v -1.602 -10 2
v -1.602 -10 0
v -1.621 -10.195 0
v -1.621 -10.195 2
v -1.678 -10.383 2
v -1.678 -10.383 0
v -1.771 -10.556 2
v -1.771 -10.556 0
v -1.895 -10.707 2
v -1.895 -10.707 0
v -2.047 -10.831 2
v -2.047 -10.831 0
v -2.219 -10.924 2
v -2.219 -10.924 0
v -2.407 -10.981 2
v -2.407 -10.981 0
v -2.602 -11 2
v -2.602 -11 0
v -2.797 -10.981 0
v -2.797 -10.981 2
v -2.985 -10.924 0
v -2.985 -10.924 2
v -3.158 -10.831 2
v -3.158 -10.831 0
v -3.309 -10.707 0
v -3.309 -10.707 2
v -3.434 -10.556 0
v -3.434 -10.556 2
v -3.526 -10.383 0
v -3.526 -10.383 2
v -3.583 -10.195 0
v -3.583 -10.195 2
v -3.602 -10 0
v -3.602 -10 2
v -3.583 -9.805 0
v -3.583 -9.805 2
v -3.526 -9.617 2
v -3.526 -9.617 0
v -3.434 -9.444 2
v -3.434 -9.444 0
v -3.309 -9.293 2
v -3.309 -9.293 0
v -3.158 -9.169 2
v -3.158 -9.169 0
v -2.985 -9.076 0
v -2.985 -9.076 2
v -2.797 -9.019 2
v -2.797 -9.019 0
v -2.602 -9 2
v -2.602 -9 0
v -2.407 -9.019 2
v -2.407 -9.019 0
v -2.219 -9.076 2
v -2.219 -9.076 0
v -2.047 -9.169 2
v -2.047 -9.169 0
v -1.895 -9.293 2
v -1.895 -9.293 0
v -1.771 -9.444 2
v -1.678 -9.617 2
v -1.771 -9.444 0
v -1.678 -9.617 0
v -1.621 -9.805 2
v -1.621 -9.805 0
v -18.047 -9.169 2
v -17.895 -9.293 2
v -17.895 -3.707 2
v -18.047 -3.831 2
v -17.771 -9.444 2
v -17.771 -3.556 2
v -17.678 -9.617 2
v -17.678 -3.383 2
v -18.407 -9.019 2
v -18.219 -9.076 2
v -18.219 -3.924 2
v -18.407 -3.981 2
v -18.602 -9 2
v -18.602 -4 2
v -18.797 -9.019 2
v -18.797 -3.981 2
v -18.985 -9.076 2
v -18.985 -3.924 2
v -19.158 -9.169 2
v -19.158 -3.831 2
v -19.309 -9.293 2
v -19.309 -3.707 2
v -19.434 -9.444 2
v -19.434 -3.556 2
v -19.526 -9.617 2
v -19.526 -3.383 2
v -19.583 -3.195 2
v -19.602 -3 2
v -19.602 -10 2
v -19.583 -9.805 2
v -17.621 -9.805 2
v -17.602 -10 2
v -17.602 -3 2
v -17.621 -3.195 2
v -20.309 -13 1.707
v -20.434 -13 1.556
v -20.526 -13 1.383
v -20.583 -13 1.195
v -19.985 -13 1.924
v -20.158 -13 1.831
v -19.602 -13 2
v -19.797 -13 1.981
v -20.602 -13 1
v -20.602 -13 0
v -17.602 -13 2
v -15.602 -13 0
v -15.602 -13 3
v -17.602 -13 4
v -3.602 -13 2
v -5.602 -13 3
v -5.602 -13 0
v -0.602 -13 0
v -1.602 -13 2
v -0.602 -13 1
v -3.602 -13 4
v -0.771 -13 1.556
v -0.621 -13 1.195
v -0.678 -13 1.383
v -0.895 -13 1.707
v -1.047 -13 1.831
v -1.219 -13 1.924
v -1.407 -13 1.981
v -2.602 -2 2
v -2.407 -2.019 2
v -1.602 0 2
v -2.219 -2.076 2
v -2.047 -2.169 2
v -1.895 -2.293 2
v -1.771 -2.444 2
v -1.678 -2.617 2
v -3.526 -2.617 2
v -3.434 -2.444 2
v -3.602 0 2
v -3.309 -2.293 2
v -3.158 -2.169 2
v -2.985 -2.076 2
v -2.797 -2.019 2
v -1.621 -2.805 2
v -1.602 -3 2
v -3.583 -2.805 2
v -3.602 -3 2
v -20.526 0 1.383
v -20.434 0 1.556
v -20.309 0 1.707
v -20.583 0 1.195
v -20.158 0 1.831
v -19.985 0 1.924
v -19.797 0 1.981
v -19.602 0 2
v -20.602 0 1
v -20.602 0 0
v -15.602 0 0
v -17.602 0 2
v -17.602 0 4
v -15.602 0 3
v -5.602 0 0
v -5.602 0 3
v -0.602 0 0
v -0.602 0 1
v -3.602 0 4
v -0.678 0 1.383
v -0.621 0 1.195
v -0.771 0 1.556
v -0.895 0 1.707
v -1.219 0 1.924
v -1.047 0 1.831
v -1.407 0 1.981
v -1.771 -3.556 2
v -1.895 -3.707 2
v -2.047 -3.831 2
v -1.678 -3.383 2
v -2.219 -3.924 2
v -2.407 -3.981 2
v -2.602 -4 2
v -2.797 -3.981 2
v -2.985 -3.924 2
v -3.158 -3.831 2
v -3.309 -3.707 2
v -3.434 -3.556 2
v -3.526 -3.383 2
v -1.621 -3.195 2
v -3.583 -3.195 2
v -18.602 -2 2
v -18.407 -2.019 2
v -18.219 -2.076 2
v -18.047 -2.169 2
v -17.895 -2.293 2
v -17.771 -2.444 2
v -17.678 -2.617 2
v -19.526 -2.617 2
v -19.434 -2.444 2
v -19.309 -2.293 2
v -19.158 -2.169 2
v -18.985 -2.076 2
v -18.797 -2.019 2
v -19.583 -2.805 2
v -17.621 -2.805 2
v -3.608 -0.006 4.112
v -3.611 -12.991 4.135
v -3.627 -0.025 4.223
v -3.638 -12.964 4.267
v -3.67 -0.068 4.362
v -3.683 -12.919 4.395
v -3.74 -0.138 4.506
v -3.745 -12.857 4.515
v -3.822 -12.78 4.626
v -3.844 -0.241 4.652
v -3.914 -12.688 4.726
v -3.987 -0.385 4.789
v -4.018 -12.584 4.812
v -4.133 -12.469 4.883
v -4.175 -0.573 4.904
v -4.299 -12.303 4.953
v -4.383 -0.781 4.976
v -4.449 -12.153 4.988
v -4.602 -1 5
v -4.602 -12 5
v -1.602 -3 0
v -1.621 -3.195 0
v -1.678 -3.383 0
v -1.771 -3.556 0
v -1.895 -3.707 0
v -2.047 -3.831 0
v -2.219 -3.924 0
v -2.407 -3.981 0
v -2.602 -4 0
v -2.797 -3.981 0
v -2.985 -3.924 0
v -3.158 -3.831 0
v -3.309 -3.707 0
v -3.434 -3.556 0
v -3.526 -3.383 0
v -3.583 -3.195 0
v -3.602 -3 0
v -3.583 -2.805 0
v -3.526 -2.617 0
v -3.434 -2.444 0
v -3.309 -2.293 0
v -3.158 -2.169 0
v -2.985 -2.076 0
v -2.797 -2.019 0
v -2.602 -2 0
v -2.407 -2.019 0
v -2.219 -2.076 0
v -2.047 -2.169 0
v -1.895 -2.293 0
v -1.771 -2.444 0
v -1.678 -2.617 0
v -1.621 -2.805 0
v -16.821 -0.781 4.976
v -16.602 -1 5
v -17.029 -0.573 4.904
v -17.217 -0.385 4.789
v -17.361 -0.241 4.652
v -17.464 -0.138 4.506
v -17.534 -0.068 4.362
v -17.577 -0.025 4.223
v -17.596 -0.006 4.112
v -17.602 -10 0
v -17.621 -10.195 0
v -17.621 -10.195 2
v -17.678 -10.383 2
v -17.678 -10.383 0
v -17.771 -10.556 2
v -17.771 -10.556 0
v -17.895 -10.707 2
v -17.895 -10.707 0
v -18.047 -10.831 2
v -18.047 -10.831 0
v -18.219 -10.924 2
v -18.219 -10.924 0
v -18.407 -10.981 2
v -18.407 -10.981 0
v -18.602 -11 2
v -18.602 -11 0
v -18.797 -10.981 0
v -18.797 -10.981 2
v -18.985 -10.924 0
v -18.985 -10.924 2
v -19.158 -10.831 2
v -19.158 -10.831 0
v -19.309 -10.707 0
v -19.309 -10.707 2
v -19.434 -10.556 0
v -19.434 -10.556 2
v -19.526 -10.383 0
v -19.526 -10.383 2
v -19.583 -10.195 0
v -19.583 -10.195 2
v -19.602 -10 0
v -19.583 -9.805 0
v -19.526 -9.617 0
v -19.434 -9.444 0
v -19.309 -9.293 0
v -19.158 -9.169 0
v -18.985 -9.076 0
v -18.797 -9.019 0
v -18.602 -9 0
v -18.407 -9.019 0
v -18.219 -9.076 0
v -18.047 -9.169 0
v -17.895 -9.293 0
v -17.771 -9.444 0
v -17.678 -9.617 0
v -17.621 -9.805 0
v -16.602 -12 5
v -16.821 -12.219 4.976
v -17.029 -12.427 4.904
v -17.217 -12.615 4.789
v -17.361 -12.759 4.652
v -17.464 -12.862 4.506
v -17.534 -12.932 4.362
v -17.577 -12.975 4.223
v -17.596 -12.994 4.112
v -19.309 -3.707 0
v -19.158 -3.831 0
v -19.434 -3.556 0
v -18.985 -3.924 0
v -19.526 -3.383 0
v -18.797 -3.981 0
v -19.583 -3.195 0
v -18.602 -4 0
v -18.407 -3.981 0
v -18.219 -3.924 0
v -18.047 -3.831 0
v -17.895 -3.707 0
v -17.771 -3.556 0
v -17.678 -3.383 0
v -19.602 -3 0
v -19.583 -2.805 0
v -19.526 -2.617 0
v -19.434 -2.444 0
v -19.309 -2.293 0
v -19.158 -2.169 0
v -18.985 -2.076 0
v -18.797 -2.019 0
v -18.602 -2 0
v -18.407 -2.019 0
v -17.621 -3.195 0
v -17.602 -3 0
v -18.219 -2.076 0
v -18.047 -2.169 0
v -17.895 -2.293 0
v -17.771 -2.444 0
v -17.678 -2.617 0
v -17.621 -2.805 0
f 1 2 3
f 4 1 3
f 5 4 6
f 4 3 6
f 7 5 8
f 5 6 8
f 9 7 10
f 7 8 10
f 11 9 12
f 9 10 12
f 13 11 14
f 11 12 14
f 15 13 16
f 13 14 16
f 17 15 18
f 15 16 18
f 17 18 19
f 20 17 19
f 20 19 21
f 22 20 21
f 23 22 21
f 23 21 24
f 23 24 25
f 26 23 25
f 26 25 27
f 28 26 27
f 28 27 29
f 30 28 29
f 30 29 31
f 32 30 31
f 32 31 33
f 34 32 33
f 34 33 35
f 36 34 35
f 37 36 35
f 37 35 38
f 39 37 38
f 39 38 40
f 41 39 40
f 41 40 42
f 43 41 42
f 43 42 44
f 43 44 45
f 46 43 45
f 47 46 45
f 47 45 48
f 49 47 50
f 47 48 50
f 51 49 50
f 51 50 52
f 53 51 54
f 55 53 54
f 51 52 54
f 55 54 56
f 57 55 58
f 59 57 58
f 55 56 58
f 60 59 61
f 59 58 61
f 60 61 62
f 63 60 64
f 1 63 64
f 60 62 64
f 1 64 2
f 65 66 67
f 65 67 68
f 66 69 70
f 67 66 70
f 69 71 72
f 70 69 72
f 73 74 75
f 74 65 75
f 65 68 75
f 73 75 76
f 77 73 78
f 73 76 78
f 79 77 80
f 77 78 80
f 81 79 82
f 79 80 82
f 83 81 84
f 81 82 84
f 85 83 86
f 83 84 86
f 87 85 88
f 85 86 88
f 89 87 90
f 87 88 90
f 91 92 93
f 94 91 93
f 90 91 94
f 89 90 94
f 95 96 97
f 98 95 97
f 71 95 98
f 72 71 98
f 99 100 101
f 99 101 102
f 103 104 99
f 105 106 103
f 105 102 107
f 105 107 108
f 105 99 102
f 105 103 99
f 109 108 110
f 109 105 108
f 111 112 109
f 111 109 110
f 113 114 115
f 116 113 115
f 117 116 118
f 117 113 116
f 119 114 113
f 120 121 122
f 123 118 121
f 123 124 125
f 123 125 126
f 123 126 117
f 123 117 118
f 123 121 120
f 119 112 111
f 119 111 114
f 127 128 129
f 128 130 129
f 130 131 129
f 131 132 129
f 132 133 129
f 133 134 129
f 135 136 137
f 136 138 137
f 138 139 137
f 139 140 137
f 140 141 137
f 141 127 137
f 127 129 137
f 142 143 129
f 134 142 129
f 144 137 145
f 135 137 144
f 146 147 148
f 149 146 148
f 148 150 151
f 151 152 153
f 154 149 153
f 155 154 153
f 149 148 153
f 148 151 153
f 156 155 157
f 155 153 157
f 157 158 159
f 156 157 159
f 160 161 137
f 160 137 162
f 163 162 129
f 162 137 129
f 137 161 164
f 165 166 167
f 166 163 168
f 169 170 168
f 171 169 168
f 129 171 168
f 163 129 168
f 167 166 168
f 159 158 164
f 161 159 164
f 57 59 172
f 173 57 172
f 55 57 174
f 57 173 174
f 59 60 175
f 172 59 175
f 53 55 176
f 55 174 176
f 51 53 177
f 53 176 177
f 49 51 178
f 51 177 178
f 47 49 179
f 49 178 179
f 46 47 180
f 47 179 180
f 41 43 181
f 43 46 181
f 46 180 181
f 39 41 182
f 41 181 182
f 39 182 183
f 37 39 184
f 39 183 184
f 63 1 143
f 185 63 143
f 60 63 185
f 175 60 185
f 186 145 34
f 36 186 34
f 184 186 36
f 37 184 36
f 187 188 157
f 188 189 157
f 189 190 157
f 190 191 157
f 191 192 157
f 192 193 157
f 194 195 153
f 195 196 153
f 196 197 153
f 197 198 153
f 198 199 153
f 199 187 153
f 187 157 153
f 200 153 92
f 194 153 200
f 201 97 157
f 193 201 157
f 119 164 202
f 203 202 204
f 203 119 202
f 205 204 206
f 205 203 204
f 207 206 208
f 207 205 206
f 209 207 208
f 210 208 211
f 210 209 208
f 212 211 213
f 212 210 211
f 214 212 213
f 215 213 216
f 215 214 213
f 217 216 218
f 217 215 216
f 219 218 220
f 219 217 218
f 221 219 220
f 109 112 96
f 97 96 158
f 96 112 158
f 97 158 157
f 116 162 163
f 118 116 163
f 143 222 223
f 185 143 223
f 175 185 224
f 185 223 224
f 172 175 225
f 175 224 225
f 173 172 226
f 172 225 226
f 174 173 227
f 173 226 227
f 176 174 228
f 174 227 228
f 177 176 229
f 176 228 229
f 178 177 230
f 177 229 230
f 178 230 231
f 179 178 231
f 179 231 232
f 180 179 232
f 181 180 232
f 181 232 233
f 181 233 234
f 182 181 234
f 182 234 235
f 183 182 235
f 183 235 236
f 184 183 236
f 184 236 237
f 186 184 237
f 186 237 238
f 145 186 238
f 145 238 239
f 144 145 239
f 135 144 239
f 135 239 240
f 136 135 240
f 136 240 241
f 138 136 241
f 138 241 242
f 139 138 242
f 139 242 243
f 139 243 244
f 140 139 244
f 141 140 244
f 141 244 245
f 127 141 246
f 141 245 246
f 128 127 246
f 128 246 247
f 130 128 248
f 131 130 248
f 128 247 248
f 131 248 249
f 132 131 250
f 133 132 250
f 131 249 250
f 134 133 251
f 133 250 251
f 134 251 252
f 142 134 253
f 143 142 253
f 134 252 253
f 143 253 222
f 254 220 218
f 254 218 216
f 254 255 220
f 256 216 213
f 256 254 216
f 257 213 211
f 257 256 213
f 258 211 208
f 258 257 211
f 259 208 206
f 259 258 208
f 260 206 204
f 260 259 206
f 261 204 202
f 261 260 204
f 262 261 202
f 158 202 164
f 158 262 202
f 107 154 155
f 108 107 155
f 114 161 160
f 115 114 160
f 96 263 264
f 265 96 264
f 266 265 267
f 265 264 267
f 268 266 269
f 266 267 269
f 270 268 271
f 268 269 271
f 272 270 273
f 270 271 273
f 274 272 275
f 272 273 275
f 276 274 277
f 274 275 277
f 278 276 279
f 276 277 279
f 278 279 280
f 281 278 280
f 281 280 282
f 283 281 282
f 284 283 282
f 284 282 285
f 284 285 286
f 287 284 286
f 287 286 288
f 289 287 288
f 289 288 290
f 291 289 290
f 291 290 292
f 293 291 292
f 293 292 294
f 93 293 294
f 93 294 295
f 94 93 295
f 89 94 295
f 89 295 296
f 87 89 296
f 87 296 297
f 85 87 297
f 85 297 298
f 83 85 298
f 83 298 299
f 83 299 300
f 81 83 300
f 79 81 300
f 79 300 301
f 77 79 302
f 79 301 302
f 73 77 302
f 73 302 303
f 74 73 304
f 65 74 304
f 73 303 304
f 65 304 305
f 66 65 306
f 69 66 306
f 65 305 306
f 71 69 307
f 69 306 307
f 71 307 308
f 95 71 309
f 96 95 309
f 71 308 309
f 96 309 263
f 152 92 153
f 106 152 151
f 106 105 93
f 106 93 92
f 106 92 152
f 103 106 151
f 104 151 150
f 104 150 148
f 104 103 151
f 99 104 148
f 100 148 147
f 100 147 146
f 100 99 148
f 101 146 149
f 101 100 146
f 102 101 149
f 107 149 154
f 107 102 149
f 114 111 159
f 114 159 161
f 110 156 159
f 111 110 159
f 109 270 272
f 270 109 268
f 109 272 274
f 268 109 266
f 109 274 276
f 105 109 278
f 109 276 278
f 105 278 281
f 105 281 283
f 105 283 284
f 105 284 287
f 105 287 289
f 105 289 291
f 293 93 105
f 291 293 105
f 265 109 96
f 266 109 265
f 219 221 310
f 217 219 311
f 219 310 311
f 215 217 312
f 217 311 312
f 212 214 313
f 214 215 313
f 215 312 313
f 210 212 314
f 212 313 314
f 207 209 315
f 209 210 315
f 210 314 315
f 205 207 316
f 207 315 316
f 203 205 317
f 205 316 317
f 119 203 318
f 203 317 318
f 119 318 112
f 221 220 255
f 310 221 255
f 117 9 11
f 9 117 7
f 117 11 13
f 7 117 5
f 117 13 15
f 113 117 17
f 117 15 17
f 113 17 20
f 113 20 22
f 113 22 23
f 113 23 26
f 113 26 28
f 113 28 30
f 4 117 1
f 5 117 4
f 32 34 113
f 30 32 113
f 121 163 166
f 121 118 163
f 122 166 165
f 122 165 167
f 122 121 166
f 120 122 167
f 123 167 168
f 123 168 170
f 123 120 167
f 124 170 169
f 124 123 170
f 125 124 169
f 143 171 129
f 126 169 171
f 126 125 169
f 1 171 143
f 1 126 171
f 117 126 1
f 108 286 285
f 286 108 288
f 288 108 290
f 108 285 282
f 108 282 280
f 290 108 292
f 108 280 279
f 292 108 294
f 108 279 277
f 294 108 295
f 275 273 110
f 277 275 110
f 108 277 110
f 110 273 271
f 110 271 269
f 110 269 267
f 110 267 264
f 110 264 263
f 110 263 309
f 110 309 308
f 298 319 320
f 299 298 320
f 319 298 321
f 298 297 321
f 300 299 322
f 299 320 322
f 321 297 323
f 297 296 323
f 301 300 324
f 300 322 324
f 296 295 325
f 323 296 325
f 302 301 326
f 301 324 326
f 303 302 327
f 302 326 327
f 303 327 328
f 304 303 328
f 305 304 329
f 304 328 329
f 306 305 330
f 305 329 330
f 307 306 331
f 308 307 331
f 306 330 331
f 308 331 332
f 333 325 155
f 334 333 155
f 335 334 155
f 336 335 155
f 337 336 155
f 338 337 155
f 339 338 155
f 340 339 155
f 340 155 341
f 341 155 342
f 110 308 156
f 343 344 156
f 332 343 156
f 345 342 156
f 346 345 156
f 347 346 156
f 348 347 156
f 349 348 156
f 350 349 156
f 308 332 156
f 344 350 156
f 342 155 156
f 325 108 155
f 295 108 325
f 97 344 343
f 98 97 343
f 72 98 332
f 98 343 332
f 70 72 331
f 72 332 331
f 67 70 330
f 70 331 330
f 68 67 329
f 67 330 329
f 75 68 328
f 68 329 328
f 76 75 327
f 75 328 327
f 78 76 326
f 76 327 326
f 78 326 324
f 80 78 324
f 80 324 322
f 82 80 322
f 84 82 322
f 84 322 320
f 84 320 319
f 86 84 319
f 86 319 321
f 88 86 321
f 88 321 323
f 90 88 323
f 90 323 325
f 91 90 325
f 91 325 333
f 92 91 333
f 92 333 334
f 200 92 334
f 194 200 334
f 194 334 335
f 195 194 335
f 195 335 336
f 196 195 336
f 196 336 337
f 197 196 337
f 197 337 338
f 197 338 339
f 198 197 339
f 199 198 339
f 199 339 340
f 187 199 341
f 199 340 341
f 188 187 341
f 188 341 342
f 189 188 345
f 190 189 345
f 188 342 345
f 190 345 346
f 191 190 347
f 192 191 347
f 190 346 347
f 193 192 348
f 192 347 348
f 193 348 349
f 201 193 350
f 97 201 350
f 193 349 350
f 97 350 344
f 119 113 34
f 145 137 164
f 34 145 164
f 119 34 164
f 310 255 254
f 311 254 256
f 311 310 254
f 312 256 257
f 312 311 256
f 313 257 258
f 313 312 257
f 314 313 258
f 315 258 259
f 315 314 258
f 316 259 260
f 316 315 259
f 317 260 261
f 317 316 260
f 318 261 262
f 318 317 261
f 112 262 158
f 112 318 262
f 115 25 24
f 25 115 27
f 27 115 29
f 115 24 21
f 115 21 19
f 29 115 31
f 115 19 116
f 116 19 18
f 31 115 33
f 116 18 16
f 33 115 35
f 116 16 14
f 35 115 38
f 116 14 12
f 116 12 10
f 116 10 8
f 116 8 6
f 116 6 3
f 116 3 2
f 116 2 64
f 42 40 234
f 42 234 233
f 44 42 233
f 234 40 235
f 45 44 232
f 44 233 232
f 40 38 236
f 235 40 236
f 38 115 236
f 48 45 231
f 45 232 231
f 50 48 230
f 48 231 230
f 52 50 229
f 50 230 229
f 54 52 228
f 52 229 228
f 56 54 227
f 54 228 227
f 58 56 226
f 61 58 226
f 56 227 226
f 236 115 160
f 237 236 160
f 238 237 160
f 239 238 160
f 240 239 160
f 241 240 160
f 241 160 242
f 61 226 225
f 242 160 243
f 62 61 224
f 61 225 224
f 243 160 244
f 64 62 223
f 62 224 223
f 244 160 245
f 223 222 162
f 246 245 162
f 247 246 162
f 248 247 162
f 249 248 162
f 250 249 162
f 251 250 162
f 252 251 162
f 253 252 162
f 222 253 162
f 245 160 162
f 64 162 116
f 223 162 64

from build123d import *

# Parameters (mm, degrees)
F1_DEPTH = 13
F2_R     = 1
F3_R     = 1
F4_DEPTH = 25
F5_R     = 1
F6_DEPTH = 25


with BuildPart() as f1:
    # F0 (on Front) → F1 (new body)
    with BuildSketch(Plane.XZ):
        Polygon((-20.602078989, 0), (-18.61380395, 0), (-15.602078989, 0), (-15.602078989, 3), (-5.602078989, 3), (-5.602078989, 0), (-0.602078989, 0), (-0.602078989, 2), (-3.602078989, 2), (-3.602078989, 5), (-17.602078989, 5), (-17.602078989, 2), (-20.602078989, 2), align=None)
    extrude(amount=F1_DEPTH)

    # F2
    f2_edges = [f1.edges().sort_by_distance(p)[0] for p in [
        (-10.602079, 0, 5),
        (-3.602079, -6.5, 5),
        (-17.602079, -6.5, 5),
        (-10.602079, -13, 5),
        (-0.602079, -6.5, 2),
        (-20.602079, -6.5, 2),
    ]]
    fillet(f2_edges, radius=F2_R)

    # F3 (on face) → F4 (cut)
    with BuildSketch(Plane(origin=(0, 0, 0), x_dir=(1, 0, 0), z_dir=(0, 0, -1))):
        with Locations((-18.602078989, 10)):
            Circle(F3_R)
        with Locations((-18.602078989, 3)):
            Circle(F3_R)
    extrude(amount=-F4_DEPTH, mode=Mode.SUBTRACT)

    # F5 (on face) → F6 (cut)
    with BuildSketch(Plane(origin=(0, 0, 0), x_dir=(1, 0, 0), z_dir=(0, 0, -1))):
        with Locations((-2.602078989, 10)):
            Circle(F5_R)
        with Locations((-2.602078989, 3)):
            Circle(F5_R)
    extrude(amount=-F6_DEPTH, mode=Mode.SUBTRACT)


solid = f1.part
